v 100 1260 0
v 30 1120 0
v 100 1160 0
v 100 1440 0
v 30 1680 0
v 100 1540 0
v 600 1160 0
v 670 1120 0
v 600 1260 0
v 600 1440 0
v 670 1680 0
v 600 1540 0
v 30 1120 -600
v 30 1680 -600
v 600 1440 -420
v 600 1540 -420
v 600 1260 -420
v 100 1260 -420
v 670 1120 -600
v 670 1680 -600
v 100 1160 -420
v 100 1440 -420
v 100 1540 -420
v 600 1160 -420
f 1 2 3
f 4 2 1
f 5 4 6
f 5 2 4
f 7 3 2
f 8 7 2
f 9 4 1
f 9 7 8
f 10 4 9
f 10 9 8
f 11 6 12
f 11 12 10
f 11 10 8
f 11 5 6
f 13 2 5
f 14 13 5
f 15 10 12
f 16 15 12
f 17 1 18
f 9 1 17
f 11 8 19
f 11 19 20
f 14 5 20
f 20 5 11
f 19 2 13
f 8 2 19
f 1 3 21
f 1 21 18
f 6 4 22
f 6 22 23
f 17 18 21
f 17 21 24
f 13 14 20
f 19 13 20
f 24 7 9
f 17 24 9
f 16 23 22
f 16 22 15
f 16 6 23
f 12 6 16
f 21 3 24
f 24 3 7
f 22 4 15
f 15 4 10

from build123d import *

# Parameters (mm, degrees)
SKETCH1_W                                      = 640
SKETCH1_H                                      = 560
OVEN_OMAKE_FIRIN_SATIN_ALINAN_64X60X56_1_DEPTH = 600
OVEN_OMAKE_FIRIN_SATIN_ALINAN_64X60X56_2_START = 1
SKETCH2_W                                      = 500
SKETCH2_H                                      = 100
OVEN_OMAKE_FIRIN_SATIN_ALINAN_64X60X56_2_DEPTH = 421
OVEN_OMAKE_FIRIN_SATIN_ALINAN_64X60X56_3_START = 1
SKETCH3_W                                      = 500
SKETCH3_H                                      = 100
OVEN_OMAKE_FIRIN_SATIN_ALINAN_64X60X56_3_DEPTH = 421


with BuildPart() as part:
    # Sketch1 → OVEN_OMAKE_firin_SATIN_ALINAN_64x60x56_1 (new body)
    with BuildSketch(Plane.XY):
        with Locations((350, 1400)):
            Rectangle(SKETCH1_W, SKETCH1_H)
    extrude(amount=-OVEN_OMAKE_FIRIN_SATIN_ALINAN_64X60X56_1_DEPTH)

    # Sketch2 → OVEN_OMAKE_firin_SATIN_ALINAN_64x60x56_2 (cut)
    with BuildSketch(Plane.XY.offset(OVEN_OMAKE_FIRIN_SATIN_ALINAN_64X60X56_2_START)):
        with Locations((350, 1210)):
            Rectangle(SKETCH2_W, SKETCH2_H)
    extrude(amount=-OVEN_OMAKE_FIRIN_SATIN_ALINAN_64X60X56_2_DEPTH, mode=Mode.SUBTRACT)

    # Sketch3 → OVEN_OMAKE_firin_SATIN_ALINAN_64x60x56_3 (cut)
    with BuildSketch(Plane.XY.offset(OVEN_OMAKE_FIRIN_SATIN_ALINAN_64X60X56_3_START)):
        with Locations((350, 1490)):
            Rectangle(SKETCH3_W, SKETCH3_H)
    extrude(amount=-OVEN_OMAKE_FIRIN_SATIN_ALINAN_64X60X56_3_DEPTH, mode=Mode.SUBTRACT)


solid = part.part
